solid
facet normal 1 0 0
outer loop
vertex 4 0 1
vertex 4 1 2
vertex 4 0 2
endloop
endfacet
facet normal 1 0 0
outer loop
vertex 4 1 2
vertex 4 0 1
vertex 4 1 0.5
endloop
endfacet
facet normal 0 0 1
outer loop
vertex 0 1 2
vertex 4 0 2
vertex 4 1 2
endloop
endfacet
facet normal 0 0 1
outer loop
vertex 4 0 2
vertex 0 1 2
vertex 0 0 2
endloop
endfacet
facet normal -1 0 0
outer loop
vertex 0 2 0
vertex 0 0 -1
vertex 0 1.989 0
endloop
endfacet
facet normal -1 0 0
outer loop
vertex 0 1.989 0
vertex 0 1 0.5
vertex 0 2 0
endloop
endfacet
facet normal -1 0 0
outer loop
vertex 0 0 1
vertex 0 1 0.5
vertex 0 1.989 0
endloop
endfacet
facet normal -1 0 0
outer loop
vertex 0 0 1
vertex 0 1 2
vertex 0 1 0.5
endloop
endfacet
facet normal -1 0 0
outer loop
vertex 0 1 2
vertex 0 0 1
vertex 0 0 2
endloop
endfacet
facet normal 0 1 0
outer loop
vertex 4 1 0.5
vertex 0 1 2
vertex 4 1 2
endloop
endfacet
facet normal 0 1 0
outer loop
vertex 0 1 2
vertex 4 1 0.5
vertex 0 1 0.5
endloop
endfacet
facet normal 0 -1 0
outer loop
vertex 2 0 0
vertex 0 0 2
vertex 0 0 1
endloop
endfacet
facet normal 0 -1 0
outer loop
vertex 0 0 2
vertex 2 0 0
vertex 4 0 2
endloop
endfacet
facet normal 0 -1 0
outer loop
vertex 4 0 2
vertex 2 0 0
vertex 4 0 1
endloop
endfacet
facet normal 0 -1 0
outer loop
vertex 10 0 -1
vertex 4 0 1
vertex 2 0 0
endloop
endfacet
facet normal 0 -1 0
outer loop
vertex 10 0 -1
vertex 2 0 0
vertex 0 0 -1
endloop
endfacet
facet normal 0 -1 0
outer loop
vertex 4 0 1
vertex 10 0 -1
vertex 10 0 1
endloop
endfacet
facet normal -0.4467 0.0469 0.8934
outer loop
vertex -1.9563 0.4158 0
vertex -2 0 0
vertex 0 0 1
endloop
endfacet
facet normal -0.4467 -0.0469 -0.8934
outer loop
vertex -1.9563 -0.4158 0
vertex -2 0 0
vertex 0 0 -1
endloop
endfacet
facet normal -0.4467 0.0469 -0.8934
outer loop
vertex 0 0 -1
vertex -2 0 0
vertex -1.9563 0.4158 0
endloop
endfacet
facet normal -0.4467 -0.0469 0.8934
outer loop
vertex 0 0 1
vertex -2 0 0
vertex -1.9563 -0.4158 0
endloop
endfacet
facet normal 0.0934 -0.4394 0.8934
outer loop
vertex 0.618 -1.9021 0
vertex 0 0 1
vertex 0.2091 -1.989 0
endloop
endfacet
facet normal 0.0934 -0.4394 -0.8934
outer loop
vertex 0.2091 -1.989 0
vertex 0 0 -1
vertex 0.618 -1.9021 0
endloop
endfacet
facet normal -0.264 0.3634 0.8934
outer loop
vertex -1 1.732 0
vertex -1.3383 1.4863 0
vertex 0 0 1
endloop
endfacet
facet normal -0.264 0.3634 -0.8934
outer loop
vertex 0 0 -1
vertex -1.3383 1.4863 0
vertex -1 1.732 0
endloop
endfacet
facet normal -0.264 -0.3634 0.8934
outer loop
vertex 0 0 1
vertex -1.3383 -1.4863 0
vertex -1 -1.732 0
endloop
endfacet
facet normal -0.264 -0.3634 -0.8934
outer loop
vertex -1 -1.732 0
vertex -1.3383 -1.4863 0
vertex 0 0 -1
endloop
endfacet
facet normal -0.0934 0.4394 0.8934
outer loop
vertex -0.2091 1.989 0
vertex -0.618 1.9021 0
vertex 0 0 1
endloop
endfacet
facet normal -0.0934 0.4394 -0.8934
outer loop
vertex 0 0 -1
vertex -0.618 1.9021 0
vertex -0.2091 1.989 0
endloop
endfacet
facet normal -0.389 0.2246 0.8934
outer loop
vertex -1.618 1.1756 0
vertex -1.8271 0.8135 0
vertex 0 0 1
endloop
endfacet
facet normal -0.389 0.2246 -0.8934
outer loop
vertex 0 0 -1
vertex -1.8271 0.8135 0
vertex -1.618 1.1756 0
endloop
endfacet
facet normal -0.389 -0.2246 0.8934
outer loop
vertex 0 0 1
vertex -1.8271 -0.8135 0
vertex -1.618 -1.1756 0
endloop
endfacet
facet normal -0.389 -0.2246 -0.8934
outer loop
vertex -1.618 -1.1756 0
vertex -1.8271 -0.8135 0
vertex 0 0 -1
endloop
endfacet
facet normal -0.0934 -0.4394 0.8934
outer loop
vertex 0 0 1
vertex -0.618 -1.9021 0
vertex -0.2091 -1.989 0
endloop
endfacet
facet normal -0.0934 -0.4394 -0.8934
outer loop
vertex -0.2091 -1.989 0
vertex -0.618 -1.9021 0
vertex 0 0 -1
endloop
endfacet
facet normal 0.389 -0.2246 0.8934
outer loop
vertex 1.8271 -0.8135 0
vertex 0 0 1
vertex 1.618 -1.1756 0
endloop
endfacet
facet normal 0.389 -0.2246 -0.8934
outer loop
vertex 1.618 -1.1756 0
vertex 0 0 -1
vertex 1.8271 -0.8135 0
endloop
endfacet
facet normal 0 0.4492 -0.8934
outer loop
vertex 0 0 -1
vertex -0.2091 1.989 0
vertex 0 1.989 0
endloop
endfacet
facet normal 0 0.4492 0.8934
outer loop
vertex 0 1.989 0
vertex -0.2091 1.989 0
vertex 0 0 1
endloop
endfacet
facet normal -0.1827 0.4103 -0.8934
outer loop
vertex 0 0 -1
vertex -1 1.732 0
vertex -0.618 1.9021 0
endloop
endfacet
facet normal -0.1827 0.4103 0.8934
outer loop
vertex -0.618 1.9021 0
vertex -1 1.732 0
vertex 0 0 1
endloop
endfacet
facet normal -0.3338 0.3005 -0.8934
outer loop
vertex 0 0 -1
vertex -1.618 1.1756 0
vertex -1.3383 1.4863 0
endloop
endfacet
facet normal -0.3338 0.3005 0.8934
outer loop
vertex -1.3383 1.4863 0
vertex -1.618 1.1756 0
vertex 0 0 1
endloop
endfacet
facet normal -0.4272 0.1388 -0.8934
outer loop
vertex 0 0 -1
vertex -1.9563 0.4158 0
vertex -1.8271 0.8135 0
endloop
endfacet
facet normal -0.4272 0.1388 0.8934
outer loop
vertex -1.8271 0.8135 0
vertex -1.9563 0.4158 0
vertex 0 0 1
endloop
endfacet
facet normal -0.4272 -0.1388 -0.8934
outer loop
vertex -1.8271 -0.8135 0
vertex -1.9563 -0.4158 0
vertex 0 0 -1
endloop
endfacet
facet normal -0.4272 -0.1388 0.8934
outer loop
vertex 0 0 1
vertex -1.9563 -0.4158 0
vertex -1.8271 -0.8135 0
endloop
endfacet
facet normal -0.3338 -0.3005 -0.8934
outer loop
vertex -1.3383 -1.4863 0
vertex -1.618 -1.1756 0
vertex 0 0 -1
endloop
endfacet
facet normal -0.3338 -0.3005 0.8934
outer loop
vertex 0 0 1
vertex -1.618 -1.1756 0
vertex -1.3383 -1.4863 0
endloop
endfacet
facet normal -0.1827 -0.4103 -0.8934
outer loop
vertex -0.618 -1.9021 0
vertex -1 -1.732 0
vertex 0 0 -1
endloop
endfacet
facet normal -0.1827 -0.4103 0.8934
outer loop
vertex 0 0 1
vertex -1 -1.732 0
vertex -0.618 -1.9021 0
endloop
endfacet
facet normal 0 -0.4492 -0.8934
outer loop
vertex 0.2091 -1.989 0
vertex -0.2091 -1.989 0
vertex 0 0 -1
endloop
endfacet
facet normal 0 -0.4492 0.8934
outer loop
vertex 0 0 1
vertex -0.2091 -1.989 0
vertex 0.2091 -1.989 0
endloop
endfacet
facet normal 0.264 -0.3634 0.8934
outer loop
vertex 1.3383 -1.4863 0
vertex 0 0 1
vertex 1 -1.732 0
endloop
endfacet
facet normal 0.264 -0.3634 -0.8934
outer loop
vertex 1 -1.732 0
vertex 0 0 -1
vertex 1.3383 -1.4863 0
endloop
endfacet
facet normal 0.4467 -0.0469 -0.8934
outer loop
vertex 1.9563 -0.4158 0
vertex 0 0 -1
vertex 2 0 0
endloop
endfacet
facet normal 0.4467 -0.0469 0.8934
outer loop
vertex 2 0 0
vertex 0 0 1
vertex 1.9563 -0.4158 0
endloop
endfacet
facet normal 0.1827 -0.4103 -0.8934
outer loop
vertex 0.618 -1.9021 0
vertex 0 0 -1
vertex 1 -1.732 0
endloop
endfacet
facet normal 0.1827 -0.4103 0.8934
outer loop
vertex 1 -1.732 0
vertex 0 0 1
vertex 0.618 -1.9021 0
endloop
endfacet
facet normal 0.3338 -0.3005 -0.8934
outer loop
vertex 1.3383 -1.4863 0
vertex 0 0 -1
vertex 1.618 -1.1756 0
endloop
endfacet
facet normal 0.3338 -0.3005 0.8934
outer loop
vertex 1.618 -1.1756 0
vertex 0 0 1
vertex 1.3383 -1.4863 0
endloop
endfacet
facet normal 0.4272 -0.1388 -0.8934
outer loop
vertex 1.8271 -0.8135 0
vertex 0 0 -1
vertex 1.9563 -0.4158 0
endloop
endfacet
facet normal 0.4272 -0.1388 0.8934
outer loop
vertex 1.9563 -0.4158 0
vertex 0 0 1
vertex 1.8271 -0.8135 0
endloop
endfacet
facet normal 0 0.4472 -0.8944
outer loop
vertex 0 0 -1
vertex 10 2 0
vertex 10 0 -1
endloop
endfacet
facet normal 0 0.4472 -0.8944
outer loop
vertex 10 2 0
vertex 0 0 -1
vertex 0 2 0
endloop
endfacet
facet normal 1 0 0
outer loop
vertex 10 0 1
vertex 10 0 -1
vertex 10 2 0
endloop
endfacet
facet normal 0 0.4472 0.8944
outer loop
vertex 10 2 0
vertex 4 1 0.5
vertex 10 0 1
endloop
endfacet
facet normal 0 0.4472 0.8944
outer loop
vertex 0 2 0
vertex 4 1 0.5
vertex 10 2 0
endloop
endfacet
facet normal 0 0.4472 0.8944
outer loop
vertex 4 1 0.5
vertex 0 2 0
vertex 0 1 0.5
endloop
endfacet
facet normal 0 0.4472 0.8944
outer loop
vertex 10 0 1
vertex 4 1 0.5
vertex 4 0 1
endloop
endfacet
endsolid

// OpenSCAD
$fn = 30;

sqrt2 = sqrt(2);

module rail_profile(vector, wall_depth){
    intersection() {
        translate([- wall_depth, - vector.y/2 ])
        square( [vector.x , vector.y] );

        union() {
            translate([-vector.x/2, 0])
            square( vector , center = true);
            scale(vector)
            rotate(45)
            square( sqrt2/2 * [1, 1], center=true);
        }
    }
}

module rail(vector, wall_depth, length){
    rotate([90,0,90])
    linear_extrude(length)
    rail_profile(vector, wall_depth = 0 );
    rail_endcap(vector, wall_depth = wall_depth);
}

module rail_endcap(vector, wall_depth){
    // intersection() {
    #
    
      cube([vector.x, 1, vector.y]);
    
    rotate_extrude()
    rail_profile(vector, wall_depth = 0 );
    // }
}


rail([4, 2], 1, 10);
